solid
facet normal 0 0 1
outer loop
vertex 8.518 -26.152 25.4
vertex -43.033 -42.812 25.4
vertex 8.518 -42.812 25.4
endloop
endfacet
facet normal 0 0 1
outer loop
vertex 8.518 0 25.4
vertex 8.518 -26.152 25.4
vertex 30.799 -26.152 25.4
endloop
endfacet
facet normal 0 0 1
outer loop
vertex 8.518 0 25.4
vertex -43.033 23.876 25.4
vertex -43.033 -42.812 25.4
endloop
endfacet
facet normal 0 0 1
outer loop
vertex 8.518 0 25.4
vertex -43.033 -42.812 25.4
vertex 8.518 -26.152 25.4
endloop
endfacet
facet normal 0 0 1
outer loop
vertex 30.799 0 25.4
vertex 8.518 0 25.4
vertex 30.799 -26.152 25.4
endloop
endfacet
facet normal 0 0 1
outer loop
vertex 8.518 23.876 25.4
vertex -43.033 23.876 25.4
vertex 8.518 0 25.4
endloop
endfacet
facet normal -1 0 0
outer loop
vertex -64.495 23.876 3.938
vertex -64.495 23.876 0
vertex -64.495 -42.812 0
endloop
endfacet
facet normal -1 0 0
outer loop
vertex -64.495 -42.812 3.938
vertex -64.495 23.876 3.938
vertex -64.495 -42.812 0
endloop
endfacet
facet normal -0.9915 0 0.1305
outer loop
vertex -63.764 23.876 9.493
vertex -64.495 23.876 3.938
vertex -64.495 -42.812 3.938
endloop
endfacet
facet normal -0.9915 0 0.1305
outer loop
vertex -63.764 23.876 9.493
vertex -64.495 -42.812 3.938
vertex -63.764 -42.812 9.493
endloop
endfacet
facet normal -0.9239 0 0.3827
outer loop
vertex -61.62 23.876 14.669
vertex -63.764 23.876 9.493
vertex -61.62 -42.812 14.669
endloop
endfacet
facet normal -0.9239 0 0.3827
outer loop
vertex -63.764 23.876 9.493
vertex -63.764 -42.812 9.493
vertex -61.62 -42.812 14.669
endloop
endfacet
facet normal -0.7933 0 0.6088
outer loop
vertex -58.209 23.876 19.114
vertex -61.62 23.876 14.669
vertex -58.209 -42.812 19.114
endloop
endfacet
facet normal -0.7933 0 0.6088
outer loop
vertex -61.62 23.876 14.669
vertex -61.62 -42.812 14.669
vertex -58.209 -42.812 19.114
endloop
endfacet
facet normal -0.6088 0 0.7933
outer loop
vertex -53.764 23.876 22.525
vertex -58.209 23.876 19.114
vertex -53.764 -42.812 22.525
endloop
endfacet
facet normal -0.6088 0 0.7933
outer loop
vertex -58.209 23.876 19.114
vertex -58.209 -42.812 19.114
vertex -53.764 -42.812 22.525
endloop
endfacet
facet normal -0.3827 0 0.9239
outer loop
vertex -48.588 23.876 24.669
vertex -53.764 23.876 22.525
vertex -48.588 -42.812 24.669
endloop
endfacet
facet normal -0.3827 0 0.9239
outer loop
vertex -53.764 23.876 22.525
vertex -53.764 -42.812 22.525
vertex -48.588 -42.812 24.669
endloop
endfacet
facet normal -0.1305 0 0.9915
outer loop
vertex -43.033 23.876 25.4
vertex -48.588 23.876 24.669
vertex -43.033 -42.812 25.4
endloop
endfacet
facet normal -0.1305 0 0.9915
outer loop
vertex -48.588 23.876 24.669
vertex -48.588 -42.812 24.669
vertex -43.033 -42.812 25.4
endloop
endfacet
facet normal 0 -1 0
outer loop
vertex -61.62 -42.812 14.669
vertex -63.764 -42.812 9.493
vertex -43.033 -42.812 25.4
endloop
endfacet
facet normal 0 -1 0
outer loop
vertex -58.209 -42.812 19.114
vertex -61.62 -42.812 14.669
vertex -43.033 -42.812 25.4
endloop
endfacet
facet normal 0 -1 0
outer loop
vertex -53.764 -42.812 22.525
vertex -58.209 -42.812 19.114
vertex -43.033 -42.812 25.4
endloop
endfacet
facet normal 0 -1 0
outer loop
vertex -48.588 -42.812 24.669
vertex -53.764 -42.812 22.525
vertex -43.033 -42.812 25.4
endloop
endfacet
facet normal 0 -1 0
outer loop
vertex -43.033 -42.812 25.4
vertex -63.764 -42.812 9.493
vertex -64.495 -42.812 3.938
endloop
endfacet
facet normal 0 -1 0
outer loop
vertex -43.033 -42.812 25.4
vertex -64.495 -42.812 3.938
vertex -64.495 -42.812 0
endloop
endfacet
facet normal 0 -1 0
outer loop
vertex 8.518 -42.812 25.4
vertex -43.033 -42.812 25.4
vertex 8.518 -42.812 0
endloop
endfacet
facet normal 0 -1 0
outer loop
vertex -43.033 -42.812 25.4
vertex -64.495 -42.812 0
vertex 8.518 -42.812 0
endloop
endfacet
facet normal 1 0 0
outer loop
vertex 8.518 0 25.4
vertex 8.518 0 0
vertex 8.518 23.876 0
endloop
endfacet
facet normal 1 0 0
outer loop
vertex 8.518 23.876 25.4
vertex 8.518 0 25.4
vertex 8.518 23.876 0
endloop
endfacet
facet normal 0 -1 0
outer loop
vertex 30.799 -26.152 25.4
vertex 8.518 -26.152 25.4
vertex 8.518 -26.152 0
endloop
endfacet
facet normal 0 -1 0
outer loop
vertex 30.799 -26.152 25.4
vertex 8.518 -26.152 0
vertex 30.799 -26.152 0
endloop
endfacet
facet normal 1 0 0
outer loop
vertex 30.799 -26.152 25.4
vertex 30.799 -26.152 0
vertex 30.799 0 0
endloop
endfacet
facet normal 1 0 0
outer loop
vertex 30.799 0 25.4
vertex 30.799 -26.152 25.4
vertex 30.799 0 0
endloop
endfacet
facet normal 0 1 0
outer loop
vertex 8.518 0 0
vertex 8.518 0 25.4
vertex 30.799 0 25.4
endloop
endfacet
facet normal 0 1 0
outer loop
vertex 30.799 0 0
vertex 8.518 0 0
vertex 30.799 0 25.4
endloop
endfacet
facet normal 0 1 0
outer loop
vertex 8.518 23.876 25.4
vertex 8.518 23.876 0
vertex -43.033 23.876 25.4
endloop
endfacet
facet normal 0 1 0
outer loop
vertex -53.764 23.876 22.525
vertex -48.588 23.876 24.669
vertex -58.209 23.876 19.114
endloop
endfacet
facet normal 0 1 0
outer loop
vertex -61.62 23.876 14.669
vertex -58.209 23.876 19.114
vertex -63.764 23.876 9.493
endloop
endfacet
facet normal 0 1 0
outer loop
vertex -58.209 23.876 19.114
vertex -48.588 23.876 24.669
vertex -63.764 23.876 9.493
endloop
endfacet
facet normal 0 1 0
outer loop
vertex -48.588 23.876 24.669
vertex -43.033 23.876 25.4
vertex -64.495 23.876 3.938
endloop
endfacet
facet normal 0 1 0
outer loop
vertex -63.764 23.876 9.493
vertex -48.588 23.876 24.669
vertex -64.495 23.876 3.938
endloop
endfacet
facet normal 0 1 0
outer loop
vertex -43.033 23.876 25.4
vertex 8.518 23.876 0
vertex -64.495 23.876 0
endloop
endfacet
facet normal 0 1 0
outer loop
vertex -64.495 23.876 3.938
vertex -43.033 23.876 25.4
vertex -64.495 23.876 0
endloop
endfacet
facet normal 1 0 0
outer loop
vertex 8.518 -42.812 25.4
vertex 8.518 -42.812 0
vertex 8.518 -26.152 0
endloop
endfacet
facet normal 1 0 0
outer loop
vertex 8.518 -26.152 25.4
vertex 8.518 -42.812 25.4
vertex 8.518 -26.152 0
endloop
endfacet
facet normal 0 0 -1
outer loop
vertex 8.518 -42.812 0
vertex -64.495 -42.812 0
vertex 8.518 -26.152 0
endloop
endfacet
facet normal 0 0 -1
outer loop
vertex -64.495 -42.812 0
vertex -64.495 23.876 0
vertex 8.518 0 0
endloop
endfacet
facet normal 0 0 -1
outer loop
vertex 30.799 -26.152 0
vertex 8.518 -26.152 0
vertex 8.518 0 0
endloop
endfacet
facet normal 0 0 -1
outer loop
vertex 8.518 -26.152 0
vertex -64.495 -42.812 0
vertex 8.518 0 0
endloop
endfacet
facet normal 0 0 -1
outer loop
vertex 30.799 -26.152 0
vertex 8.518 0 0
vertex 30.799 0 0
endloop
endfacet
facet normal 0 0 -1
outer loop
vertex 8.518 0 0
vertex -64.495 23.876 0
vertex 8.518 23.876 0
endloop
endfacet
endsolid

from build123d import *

# Parameters (mm, degrees)
F0_W     = 8.5184480995
F0_H     = 26.1520203203
F0_W_2   = 22.2805645317
F1_DEPTH = 25.4
F2_R     = 21.4623585695
F3_W     = 22.7771224454
F3_H     = 30.0578936003
F4_DEPTH = 3.81


with BuildPart() as f1:
    # F0 (on Top) → F1 (new body)
    with BuildSketch(Plane.XY):
        Polygon((-64.4950717688, 23.875804618), (-64.4950717688, -42.812038213), (8.5184480995, -42.812038213), (8.5184480995, -26.1520203203), (0, -26.1520203203), (0, 0), (8.5184480995, 0), (8.5184480995, 23.875804618), align=None)
        with Locations((4.2592240497, -13.0760101601)):
            Rectangle(F0_W, F0_H)
        with Locations((19.6587303653, -13.0760101601)):
            Rectangle(F0_W_2, F0_H)
    extrude(amount=F1_DEPTH)

    # F2
    f2_edges = [f1.edges().sort_by_distance(p)[0] for p in [
        (-64.495072, -9.468117, 25.4),
    ]]
    fillet(f2_edges, radius=F2_R)

    # F3 (on face) → F4 (join)
    with BuildSketch(Plane.XY.offset(25.4)):
        with Locations((-21.1946009658, -9.6237577964)):
            Rectangle(F3_W, F3_H)
    extrude(amount=-F4_DEPTH)


solid = f1.part
